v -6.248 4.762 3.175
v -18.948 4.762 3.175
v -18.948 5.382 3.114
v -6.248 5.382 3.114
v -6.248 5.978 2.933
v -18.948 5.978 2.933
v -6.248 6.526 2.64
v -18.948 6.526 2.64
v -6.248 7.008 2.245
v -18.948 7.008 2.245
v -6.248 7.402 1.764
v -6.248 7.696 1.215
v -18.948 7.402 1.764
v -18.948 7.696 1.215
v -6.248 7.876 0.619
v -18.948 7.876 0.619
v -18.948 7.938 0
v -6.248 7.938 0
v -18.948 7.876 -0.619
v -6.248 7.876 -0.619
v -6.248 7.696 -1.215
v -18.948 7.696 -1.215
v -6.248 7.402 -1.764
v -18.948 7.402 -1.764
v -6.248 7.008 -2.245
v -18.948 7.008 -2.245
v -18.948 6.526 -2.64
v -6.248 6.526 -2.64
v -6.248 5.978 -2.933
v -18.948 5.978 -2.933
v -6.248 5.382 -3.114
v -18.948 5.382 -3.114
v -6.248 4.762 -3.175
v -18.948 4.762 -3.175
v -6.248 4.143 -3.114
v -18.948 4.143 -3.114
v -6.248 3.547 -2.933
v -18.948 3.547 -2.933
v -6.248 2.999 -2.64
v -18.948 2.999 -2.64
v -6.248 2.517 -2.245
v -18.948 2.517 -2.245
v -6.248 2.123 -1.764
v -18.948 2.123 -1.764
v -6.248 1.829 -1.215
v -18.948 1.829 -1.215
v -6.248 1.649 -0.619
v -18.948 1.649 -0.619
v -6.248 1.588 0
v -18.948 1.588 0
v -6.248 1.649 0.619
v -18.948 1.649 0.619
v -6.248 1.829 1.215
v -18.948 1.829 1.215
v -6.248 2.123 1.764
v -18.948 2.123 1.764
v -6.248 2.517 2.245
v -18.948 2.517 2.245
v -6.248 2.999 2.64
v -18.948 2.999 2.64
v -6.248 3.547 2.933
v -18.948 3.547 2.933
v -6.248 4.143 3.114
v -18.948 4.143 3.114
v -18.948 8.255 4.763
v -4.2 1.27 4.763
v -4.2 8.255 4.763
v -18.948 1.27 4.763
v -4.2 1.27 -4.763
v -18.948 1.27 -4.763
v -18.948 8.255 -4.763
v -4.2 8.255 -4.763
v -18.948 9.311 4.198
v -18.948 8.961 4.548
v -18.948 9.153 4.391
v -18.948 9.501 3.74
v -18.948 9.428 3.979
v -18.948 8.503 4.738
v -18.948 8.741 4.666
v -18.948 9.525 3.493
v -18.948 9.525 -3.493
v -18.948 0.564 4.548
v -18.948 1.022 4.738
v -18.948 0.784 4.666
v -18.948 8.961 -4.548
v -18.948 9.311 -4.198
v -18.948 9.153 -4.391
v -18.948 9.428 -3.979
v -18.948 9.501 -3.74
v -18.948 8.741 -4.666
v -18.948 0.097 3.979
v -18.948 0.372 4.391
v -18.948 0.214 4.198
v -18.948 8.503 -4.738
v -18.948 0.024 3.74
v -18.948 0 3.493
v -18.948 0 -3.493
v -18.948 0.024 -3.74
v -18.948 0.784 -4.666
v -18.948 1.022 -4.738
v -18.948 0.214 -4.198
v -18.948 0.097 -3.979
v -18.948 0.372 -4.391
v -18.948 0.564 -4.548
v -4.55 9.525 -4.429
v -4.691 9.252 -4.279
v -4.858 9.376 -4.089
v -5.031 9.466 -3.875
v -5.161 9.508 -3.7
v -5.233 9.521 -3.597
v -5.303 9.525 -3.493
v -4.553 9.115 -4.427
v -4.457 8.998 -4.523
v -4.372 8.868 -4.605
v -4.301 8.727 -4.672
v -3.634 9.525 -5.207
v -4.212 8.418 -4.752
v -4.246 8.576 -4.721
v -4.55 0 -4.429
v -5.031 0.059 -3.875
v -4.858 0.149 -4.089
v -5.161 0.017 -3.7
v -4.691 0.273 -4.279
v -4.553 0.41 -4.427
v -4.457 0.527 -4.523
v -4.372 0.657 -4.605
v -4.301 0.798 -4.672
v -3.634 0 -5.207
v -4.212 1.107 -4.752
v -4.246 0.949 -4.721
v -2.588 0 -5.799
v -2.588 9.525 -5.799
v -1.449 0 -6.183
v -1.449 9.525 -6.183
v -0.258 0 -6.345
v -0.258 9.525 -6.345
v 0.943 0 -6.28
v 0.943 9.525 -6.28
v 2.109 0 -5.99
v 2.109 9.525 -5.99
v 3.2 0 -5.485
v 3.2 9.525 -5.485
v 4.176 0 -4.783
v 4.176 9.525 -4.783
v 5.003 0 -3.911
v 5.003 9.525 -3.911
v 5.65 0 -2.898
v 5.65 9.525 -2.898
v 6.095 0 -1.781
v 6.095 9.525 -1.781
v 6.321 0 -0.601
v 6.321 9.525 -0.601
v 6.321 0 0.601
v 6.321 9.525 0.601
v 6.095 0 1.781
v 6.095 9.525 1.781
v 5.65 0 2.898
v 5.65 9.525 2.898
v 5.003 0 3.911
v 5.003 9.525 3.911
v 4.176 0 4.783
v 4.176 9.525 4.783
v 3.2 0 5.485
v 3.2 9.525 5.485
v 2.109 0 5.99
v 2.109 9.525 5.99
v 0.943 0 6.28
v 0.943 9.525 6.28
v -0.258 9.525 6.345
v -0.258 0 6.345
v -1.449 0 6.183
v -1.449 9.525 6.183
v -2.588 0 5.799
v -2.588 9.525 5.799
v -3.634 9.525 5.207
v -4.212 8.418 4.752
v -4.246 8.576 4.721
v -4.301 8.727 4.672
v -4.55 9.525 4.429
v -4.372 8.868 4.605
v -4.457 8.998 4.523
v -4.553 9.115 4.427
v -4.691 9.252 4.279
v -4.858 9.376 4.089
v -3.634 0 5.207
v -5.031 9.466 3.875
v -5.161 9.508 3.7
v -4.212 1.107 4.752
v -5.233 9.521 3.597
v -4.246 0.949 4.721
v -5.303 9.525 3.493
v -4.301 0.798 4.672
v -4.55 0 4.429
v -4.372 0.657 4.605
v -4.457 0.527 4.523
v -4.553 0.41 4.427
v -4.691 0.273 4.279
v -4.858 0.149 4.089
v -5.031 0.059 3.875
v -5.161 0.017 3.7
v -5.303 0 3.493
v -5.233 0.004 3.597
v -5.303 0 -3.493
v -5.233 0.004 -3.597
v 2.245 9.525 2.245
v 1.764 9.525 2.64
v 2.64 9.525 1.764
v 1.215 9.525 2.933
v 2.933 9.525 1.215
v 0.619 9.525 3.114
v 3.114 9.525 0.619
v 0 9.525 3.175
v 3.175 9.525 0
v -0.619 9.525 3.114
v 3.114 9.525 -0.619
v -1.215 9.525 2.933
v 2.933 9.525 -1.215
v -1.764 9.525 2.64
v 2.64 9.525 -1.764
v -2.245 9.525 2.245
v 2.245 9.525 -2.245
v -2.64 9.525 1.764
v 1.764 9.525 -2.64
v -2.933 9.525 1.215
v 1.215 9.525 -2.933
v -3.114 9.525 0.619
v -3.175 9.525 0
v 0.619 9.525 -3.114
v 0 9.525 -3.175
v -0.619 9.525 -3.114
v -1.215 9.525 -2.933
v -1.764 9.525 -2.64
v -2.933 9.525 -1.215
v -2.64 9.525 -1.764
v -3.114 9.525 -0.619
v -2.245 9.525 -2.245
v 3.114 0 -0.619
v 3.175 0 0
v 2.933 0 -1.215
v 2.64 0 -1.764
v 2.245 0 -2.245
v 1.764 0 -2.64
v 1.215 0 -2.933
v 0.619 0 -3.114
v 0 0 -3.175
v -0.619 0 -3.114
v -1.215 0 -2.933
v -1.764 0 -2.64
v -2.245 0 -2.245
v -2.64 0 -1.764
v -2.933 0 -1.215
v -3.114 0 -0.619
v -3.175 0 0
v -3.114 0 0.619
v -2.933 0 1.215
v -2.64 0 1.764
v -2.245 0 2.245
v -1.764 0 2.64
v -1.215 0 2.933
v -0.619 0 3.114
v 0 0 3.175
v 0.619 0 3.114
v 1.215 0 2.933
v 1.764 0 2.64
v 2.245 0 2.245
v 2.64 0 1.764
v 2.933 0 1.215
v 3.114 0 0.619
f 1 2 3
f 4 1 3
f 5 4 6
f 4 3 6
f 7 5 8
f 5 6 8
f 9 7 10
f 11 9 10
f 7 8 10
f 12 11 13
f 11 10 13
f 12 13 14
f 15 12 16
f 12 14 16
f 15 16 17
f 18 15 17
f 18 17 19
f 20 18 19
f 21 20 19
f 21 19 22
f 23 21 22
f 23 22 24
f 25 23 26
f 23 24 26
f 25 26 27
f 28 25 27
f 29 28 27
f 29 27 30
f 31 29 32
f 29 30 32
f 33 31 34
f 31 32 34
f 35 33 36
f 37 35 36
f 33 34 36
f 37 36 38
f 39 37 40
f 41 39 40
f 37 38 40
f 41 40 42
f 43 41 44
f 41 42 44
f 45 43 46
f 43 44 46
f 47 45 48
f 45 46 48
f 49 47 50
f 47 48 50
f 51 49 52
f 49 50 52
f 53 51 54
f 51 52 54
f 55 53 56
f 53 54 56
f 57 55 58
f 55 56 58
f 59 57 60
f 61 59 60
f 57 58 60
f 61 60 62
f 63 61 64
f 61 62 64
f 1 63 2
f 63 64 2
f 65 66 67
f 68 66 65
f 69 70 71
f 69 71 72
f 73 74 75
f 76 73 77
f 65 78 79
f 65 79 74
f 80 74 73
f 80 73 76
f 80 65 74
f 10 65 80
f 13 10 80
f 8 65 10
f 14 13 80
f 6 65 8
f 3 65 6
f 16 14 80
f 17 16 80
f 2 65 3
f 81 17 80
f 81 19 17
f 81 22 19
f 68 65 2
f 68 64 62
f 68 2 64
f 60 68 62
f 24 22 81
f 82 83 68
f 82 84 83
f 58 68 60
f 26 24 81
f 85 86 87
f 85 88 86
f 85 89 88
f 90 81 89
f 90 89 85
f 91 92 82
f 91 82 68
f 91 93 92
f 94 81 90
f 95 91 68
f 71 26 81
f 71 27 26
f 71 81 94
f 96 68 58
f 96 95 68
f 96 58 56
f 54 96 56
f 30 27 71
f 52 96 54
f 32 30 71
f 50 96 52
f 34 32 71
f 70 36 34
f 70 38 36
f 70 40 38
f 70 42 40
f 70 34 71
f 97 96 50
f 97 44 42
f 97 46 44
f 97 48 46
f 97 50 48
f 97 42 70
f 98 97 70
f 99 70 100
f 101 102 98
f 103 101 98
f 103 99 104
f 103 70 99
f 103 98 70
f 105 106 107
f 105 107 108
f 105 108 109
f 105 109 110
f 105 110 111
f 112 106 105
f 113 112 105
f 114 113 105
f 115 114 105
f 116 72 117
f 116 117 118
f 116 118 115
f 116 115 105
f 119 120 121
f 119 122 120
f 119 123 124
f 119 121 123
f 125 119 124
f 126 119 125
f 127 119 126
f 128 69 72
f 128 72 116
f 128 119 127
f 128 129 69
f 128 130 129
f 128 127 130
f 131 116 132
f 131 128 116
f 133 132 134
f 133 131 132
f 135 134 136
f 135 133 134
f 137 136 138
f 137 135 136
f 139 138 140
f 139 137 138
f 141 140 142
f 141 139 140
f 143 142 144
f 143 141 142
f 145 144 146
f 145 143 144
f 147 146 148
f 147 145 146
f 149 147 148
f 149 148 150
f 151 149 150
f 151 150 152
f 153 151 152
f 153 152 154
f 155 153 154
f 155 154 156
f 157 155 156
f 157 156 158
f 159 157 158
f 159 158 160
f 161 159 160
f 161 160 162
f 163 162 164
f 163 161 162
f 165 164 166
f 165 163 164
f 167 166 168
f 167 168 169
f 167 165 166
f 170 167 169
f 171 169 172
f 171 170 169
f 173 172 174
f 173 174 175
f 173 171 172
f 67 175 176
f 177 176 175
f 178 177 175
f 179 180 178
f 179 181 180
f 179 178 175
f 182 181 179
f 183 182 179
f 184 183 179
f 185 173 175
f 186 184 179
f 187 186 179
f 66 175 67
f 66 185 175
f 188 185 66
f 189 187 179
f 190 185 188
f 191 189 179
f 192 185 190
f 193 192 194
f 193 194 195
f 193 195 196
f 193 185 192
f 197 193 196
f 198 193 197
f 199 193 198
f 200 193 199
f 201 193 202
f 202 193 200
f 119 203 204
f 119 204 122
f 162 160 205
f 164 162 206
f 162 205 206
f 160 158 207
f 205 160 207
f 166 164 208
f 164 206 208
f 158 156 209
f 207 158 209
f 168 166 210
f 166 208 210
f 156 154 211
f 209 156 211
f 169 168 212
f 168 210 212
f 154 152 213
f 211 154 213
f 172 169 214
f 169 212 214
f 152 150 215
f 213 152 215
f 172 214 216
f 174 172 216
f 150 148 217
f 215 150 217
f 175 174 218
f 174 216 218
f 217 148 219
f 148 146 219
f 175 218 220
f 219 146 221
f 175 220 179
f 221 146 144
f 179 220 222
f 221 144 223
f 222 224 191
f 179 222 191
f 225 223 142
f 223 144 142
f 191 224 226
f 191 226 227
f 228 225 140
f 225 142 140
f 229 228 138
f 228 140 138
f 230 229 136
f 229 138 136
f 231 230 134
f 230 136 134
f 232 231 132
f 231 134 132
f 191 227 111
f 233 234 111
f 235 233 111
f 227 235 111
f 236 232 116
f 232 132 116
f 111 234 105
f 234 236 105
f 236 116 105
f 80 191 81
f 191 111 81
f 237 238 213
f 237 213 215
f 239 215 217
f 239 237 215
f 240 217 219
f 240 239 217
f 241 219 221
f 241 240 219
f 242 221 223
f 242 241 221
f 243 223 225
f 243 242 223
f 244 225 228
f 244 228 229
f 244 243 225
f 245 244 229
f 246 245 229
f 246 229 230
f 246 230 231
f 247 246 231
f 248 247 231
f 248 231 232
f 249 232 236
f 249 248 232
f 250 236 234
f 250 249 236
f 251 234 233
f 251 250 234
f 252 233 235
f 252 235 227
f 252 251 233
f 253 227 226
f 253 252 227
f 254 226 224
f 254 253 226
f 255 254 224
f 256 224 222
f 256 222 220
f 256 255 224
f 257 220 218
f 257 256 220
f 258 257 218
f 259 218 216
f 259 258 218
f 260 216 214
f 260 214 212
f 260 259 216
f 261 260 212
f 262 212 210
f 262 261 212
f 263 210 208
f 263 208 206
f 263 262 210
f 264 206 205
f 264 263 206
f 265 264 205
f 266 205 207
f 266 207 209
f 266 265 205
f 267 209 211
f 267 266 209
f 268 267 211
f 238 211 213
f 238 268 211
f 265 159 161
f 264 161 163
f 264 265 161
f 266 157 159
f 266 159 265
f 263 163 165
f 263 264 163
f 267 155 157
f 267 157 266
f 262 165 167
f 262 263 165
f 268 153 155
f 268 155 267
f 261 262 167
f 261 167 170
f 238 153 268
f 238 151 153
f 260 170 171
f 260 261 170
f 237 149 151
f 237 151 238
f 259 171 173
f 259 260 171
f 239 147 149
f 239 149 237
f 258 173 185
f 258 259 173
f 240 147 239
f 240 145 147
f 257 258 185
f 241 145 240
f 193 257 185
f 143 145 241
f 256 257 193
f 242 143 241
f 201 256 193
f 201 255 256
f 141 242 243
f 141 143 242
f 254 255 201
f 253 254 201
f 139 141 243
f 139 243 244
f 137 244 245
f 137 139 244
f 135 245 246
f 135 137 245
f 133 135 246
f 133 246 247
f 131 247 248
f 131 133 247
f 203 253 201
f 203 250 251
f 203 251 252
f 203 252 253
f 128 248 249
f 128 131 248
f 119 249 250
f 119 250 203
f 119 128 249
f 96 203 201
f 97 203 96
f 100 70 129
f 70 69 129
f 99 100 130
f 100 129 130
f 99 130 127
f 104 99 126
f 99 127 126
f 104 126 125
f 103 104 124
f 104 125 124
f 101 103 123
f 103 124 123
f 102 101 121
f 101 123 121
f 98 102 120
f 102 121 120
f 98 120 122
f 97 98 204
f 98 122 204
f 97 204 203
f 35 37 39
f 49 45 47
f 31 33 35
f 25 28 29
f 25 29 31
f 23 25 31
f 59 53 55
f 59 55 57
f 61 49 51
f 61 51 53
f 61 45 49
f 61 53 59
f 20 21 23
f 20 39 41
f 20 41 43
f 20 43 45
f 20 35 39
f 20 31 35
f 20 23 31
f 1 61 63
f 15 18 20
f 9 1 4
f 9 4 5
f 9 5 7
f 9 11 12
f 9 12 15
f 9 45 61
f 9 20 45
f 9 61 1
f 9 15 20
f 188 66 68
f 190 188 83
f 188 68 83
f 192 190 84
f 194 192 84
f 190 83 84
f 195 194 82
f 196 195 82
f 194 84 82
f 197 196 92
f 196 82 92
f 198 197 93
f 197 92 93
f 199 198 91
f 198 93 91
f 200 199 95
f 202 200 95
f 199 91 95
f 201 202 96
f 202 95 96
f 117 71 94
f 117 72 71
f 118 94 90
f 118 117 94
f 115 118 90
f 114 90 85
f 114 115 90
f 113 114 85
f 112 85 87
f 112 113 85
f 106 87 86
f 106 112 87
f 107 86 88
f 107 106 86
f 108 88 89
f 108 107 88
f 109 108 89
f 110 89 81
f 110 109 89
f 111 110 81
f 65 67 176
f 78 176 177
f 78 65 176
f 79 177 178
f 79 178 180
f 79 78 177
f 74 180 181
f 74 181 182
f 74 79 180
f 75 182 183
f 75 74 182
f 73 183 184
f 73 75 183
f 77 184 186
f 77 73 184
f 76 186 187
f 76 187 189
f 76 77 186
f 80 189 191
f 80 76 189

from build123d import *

# Parameters (mm, degrees)
SKETCH1_R           = 3.175
BOSS_EXTRUDE1_DEPTH = 9.525
FILLET1_R           = 1.27
SKETCH2_R           = 3.175
CUT_EXTRUDE1_DEPTH  = 12.7


with BuildPart() as part:
    # Sketch1 → Boss-Extrude1 (new body)
    with BuildSketch(Plane(origin=(0, 0, 0), x_dir=(1, 0, 0), z_dir=(0, 1, 0))):
        with BuildLine():
            Line((-4.200130206, -4.7625), (-18.948458917, -4.7625))
            Line((-18.948458917, -4.7625), (-18.948458917, 4.7625))
            Line((-18.948458917, 4.7625), (-4.200130206, 4.7625))
            ThreePointArc((-4.200130206, 4.7625), (6.35, 0), (-4.200130206, -4.7625))
        make_face()
        Circle(SKETCH1_R, mode=Mode.SUBTRACT)
    extrude(amount=BOSS_EXTRUDE1_DEPTH)

    # Fillet1
    fillet1_edges = [part.edges().sort_by_distance(p)[0] for p in [
        (-11.574294562, 9.525, -4.7625),
        (-11.574294562, 0, -4.7625),
        (-11.574294562, 0, 4.7625),
        (-11.574294562, 9.525, 4.7625),
    ]]
    fillet(fillet1_edges, radius=FILLET1_R)

    # Sketch2 → Cut-Extrude1 (cut)
    with BuildSketch(Plane.ZY.offset(18.948458917)):
        with Locations((0, 4.7625)):
            Circle(SKETCH2_R)
    extrude(amount=-CUT_EXTRUDE1_DEPTH, mode=Mode.SUBTRACT)


solid = part.part
